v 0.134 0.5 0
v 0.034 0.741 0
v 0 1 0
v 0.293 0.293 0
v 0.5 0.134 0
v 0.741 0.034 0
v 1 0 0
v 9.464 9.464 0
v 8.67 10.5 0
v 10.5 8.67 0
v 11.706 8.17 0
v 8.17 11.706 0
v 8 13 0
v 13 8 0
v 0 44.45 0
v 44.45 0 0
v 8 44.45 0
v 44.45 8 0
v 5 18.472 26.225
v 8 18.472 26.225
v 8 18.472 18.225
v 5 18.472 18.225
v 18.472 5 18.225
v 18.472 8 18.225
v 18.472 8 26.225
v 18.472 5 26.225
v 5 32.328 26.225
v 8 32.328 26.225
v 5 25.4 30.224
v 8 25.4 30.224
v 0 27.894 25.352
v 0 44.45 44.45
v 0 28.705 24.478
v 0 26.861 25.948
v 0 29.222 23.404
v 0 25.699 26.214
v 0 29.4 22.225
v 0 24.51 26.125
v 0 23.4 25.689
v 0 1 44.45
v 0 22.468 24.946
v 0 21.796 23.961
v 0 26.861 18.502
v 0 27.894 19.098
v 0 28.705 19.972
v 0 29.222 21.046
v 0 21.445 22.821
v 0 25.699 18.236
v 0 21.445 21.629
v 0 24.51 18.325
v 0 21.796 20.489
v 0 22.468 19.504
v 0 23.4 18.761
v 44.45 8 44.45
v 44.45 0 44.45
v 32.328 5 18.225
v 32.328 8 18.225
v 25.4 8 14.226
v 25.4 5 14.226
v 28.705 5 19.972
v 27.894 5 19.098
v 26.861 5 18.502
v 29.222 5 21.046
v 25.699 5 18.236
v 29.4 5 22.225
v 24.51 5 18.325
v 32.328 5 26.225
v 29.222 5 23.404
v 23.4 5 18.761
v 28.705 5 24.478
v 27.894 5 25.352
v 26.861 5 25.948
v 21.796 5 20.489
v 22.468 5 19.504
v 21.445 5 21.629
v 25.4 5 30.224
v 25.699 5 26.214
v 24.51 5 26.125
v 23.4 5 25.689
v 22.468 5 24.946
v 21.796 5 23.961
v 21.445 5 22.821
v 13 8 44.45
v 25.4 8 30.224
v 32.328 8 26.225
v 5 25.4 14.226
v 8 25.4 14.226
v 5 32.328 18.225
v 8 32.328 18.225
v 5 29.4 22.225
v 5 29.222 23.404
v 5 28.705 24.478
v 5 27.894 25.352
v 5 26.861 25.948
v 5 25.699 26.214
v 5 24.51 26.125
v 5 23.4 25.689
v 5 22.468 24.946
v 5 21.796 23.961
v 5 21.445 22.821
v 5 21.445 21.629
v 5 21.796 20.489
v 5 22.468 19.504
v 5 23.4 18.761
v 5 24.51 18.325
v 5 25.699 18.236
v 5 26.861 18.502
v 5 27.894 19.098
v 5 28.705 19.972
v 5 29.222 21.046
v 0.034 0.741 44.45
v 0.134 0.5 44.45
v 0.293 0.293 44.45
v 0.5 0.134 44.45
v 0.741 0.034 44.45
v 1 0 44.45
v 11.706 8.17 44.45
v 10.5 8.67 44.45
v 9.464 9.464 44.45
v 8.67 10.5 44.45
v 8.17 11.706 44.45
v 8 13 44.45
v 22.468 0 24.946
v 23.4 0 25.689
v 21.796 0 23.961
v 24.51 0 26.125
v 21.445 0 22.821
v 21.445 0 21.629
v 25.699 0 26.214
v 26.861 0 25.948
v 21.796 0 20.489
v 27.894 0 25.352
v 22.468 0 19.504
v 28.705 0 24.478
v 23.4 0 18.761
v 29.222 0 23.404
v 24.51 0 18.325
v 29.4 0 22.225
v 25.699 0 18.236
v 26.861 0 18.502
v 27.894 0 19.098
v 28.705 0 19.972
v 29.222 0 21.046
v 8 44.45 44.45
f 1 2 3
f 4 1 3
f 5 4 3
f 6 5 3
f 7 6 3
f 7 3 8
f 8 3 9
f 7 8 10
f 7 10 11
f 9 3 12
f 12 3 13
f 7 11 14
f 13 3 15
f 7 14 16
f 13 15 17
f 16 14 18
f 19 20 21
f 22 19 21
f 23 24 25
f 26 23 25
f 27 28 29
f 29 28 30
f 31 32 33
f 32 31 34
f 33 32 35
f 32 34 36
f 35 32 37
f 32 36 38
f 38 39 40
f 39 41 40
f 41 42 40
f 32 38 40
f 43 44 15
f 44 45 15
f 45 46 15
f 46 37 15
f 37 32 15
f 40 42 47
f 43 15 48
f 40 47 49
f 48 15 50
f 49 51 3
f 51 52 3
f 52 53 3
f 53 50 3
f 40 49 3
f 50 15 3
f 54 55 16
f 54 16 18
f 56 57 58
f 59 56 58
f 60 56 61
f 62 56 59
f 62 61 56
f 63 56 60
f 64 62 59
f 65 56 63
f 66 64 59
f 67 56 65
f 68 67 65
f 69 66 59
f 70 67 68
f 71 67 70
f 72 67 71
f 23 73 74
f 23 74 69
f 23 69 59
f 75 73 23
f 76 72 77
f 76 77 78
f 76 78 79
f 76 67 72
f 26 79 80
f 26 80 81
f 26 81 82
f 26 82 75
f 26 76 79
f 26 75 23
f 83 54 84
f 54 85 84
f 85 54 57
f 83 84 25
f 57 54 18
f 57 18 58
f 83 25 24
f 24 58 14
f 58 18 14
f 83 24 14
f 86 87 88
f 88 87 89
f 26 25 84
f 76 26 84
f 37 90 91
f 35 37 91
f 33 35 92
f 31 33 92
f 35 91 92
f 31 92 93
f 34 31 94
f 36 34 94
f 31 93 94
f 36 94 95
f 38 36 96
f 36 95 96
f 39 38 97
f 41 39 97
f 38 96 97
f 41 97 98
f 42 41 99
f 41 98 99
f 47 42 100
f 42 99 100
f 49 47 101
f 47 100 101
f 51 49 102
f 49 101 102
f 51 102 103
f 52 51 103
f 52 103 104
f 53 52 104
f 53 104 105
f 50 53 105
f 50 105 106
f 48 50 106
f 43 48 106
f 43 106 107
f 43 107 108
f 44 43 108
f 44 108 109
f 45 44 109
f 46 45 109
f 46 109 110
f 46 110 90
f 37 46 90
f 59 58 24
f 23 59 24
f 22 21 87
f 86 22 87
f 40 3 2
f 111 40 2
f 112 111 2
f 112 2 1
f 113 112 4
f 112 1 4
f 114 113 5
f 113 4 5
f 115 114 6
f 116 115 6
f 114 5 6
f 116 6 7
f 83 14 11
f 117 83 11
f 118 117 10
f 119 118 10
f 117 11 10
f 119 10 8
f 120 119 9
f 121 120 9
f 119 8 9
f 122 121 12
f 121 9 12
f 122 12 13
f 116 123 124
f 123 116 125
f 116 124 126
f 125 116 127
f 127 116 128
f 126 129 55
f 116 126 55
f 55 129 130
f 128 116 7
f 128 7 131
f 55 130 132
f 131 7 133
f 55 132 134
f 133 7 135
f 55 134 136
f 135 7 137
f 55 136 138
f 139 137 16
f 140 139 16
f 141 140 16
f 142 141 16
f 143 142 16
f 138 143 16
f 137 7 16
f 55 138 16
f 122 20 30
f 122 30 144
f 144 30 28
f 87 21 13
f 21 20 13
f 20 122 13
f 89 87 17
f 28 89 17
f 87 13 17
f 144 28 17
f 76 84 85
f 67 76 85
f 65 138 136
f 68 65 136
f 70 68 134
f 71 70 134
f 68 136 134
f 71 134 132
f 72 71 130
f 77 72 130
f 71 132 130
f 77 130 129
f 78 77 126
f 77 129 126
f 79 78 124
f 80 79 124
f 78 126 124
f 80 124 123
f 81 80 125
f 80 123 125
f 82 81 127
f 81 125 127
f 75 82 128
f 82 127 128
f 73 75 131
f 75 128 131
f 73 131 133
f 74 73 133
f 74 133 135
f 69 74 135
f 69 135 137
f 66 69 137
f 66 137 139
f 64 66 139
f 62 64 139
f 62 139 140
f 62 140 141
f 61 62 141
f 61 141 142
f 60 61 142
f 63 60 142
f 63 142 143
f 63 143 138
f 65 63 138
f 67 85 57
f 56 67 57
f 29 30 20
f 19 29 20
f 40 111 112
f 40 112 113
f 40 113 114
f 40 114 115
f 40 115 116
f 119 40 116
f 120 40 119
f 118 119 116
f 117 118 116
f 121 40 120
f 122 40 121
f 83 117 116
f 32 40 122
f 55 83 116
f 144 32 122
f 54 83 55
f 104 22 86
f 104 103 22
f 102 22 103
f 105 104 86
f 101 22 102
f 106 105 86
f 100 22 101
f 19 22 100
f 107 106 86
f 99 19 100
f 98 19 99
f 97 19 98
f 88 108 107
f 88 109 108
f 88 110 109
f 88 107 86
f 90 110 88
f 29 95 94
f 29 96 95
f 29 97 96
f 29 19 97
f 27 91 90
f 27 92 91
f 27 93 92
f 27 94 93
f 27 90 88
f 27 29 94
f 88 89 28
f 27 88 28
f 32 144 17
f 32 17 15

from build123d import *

# Parameters (mm, degrees)
F1_DEPTH = 44.45
F2_R     = 4
F3_DEPTH = 8
F4_R     = 4
F5_DEPTH = 8
F7_DEPTH = 3
F9_DEPTH = 3


with BuildPart() as f1:
    # F0 (on Top) → F1 (new body)
    with BuildSketch(Plane.XY):
        with BuildLine():
            Line((8, 44.45), (0, 44.45))
            Line((0, 44.45), (0, 1))
            ThreePointArc((0, 1), (0.292893, 0.292893), (1, 0))
            Line((1, 0), (44.45, 0))
            Line((44.45, 0), (44.45, 8))
            Line((44.45, 8), (13, 8))
            ThreePointArc((13, 8), (9.464466, 9.464466), (8, 13))
            Line((8, 13), (8, 44.45))
        make_face()
    extrude(amount=F1_DEPTH)

    # F2 (on face) → F3 (cut, through all)
    with BuildSketch(Plane.YZ.offset(8)):
        with Locations((25.4, 22.225)):
            Circle(F2_R)
    extrude(amount=-F3_DEPTH, mode=Mode.SUBTRACT)

    # F4 (on face) → F5 (cut, through all)
    with BuildSketch(Plane.XZ):
        with Locations((25.4, 22.225)):
            Circle(F4_R)
    extrude(amount=-F5_DEPTH, mode=Mode.SUBTRACT)

    # F6 (on face) → F7 (cut)
    with BuildSketch(Plane.YZ.offset(8)):
        Polygon((25.4, 14.225812), (32.3275, 18.225406), (32.3275, 26.224594), (25.4, 30.224188), (18.4725, 26.224594), (18.4725, 18.225406), align=None)
    extrude(amount=-F7_DEPTH, mode=Mode.SUBTRACT)

    # F8 (on face) → F9 (cut)
    with BuildSketch(Plane(origin=(0, 8, 0), x_dir=(-1, 0, 0), z_dir=(0, 1, 0))):
        Polygon((-25.4, 30.224188), (-32.3275, 26.224594), (-32.3275, 18.225406), (-25.4, 14.225812), (-18.4725, 18.225406), (-18.4725, 26.224594), align=None)
    extrude(amount=-F9_DEPTH, mode=Mode.SUBTRACT)


solid = f1.part
